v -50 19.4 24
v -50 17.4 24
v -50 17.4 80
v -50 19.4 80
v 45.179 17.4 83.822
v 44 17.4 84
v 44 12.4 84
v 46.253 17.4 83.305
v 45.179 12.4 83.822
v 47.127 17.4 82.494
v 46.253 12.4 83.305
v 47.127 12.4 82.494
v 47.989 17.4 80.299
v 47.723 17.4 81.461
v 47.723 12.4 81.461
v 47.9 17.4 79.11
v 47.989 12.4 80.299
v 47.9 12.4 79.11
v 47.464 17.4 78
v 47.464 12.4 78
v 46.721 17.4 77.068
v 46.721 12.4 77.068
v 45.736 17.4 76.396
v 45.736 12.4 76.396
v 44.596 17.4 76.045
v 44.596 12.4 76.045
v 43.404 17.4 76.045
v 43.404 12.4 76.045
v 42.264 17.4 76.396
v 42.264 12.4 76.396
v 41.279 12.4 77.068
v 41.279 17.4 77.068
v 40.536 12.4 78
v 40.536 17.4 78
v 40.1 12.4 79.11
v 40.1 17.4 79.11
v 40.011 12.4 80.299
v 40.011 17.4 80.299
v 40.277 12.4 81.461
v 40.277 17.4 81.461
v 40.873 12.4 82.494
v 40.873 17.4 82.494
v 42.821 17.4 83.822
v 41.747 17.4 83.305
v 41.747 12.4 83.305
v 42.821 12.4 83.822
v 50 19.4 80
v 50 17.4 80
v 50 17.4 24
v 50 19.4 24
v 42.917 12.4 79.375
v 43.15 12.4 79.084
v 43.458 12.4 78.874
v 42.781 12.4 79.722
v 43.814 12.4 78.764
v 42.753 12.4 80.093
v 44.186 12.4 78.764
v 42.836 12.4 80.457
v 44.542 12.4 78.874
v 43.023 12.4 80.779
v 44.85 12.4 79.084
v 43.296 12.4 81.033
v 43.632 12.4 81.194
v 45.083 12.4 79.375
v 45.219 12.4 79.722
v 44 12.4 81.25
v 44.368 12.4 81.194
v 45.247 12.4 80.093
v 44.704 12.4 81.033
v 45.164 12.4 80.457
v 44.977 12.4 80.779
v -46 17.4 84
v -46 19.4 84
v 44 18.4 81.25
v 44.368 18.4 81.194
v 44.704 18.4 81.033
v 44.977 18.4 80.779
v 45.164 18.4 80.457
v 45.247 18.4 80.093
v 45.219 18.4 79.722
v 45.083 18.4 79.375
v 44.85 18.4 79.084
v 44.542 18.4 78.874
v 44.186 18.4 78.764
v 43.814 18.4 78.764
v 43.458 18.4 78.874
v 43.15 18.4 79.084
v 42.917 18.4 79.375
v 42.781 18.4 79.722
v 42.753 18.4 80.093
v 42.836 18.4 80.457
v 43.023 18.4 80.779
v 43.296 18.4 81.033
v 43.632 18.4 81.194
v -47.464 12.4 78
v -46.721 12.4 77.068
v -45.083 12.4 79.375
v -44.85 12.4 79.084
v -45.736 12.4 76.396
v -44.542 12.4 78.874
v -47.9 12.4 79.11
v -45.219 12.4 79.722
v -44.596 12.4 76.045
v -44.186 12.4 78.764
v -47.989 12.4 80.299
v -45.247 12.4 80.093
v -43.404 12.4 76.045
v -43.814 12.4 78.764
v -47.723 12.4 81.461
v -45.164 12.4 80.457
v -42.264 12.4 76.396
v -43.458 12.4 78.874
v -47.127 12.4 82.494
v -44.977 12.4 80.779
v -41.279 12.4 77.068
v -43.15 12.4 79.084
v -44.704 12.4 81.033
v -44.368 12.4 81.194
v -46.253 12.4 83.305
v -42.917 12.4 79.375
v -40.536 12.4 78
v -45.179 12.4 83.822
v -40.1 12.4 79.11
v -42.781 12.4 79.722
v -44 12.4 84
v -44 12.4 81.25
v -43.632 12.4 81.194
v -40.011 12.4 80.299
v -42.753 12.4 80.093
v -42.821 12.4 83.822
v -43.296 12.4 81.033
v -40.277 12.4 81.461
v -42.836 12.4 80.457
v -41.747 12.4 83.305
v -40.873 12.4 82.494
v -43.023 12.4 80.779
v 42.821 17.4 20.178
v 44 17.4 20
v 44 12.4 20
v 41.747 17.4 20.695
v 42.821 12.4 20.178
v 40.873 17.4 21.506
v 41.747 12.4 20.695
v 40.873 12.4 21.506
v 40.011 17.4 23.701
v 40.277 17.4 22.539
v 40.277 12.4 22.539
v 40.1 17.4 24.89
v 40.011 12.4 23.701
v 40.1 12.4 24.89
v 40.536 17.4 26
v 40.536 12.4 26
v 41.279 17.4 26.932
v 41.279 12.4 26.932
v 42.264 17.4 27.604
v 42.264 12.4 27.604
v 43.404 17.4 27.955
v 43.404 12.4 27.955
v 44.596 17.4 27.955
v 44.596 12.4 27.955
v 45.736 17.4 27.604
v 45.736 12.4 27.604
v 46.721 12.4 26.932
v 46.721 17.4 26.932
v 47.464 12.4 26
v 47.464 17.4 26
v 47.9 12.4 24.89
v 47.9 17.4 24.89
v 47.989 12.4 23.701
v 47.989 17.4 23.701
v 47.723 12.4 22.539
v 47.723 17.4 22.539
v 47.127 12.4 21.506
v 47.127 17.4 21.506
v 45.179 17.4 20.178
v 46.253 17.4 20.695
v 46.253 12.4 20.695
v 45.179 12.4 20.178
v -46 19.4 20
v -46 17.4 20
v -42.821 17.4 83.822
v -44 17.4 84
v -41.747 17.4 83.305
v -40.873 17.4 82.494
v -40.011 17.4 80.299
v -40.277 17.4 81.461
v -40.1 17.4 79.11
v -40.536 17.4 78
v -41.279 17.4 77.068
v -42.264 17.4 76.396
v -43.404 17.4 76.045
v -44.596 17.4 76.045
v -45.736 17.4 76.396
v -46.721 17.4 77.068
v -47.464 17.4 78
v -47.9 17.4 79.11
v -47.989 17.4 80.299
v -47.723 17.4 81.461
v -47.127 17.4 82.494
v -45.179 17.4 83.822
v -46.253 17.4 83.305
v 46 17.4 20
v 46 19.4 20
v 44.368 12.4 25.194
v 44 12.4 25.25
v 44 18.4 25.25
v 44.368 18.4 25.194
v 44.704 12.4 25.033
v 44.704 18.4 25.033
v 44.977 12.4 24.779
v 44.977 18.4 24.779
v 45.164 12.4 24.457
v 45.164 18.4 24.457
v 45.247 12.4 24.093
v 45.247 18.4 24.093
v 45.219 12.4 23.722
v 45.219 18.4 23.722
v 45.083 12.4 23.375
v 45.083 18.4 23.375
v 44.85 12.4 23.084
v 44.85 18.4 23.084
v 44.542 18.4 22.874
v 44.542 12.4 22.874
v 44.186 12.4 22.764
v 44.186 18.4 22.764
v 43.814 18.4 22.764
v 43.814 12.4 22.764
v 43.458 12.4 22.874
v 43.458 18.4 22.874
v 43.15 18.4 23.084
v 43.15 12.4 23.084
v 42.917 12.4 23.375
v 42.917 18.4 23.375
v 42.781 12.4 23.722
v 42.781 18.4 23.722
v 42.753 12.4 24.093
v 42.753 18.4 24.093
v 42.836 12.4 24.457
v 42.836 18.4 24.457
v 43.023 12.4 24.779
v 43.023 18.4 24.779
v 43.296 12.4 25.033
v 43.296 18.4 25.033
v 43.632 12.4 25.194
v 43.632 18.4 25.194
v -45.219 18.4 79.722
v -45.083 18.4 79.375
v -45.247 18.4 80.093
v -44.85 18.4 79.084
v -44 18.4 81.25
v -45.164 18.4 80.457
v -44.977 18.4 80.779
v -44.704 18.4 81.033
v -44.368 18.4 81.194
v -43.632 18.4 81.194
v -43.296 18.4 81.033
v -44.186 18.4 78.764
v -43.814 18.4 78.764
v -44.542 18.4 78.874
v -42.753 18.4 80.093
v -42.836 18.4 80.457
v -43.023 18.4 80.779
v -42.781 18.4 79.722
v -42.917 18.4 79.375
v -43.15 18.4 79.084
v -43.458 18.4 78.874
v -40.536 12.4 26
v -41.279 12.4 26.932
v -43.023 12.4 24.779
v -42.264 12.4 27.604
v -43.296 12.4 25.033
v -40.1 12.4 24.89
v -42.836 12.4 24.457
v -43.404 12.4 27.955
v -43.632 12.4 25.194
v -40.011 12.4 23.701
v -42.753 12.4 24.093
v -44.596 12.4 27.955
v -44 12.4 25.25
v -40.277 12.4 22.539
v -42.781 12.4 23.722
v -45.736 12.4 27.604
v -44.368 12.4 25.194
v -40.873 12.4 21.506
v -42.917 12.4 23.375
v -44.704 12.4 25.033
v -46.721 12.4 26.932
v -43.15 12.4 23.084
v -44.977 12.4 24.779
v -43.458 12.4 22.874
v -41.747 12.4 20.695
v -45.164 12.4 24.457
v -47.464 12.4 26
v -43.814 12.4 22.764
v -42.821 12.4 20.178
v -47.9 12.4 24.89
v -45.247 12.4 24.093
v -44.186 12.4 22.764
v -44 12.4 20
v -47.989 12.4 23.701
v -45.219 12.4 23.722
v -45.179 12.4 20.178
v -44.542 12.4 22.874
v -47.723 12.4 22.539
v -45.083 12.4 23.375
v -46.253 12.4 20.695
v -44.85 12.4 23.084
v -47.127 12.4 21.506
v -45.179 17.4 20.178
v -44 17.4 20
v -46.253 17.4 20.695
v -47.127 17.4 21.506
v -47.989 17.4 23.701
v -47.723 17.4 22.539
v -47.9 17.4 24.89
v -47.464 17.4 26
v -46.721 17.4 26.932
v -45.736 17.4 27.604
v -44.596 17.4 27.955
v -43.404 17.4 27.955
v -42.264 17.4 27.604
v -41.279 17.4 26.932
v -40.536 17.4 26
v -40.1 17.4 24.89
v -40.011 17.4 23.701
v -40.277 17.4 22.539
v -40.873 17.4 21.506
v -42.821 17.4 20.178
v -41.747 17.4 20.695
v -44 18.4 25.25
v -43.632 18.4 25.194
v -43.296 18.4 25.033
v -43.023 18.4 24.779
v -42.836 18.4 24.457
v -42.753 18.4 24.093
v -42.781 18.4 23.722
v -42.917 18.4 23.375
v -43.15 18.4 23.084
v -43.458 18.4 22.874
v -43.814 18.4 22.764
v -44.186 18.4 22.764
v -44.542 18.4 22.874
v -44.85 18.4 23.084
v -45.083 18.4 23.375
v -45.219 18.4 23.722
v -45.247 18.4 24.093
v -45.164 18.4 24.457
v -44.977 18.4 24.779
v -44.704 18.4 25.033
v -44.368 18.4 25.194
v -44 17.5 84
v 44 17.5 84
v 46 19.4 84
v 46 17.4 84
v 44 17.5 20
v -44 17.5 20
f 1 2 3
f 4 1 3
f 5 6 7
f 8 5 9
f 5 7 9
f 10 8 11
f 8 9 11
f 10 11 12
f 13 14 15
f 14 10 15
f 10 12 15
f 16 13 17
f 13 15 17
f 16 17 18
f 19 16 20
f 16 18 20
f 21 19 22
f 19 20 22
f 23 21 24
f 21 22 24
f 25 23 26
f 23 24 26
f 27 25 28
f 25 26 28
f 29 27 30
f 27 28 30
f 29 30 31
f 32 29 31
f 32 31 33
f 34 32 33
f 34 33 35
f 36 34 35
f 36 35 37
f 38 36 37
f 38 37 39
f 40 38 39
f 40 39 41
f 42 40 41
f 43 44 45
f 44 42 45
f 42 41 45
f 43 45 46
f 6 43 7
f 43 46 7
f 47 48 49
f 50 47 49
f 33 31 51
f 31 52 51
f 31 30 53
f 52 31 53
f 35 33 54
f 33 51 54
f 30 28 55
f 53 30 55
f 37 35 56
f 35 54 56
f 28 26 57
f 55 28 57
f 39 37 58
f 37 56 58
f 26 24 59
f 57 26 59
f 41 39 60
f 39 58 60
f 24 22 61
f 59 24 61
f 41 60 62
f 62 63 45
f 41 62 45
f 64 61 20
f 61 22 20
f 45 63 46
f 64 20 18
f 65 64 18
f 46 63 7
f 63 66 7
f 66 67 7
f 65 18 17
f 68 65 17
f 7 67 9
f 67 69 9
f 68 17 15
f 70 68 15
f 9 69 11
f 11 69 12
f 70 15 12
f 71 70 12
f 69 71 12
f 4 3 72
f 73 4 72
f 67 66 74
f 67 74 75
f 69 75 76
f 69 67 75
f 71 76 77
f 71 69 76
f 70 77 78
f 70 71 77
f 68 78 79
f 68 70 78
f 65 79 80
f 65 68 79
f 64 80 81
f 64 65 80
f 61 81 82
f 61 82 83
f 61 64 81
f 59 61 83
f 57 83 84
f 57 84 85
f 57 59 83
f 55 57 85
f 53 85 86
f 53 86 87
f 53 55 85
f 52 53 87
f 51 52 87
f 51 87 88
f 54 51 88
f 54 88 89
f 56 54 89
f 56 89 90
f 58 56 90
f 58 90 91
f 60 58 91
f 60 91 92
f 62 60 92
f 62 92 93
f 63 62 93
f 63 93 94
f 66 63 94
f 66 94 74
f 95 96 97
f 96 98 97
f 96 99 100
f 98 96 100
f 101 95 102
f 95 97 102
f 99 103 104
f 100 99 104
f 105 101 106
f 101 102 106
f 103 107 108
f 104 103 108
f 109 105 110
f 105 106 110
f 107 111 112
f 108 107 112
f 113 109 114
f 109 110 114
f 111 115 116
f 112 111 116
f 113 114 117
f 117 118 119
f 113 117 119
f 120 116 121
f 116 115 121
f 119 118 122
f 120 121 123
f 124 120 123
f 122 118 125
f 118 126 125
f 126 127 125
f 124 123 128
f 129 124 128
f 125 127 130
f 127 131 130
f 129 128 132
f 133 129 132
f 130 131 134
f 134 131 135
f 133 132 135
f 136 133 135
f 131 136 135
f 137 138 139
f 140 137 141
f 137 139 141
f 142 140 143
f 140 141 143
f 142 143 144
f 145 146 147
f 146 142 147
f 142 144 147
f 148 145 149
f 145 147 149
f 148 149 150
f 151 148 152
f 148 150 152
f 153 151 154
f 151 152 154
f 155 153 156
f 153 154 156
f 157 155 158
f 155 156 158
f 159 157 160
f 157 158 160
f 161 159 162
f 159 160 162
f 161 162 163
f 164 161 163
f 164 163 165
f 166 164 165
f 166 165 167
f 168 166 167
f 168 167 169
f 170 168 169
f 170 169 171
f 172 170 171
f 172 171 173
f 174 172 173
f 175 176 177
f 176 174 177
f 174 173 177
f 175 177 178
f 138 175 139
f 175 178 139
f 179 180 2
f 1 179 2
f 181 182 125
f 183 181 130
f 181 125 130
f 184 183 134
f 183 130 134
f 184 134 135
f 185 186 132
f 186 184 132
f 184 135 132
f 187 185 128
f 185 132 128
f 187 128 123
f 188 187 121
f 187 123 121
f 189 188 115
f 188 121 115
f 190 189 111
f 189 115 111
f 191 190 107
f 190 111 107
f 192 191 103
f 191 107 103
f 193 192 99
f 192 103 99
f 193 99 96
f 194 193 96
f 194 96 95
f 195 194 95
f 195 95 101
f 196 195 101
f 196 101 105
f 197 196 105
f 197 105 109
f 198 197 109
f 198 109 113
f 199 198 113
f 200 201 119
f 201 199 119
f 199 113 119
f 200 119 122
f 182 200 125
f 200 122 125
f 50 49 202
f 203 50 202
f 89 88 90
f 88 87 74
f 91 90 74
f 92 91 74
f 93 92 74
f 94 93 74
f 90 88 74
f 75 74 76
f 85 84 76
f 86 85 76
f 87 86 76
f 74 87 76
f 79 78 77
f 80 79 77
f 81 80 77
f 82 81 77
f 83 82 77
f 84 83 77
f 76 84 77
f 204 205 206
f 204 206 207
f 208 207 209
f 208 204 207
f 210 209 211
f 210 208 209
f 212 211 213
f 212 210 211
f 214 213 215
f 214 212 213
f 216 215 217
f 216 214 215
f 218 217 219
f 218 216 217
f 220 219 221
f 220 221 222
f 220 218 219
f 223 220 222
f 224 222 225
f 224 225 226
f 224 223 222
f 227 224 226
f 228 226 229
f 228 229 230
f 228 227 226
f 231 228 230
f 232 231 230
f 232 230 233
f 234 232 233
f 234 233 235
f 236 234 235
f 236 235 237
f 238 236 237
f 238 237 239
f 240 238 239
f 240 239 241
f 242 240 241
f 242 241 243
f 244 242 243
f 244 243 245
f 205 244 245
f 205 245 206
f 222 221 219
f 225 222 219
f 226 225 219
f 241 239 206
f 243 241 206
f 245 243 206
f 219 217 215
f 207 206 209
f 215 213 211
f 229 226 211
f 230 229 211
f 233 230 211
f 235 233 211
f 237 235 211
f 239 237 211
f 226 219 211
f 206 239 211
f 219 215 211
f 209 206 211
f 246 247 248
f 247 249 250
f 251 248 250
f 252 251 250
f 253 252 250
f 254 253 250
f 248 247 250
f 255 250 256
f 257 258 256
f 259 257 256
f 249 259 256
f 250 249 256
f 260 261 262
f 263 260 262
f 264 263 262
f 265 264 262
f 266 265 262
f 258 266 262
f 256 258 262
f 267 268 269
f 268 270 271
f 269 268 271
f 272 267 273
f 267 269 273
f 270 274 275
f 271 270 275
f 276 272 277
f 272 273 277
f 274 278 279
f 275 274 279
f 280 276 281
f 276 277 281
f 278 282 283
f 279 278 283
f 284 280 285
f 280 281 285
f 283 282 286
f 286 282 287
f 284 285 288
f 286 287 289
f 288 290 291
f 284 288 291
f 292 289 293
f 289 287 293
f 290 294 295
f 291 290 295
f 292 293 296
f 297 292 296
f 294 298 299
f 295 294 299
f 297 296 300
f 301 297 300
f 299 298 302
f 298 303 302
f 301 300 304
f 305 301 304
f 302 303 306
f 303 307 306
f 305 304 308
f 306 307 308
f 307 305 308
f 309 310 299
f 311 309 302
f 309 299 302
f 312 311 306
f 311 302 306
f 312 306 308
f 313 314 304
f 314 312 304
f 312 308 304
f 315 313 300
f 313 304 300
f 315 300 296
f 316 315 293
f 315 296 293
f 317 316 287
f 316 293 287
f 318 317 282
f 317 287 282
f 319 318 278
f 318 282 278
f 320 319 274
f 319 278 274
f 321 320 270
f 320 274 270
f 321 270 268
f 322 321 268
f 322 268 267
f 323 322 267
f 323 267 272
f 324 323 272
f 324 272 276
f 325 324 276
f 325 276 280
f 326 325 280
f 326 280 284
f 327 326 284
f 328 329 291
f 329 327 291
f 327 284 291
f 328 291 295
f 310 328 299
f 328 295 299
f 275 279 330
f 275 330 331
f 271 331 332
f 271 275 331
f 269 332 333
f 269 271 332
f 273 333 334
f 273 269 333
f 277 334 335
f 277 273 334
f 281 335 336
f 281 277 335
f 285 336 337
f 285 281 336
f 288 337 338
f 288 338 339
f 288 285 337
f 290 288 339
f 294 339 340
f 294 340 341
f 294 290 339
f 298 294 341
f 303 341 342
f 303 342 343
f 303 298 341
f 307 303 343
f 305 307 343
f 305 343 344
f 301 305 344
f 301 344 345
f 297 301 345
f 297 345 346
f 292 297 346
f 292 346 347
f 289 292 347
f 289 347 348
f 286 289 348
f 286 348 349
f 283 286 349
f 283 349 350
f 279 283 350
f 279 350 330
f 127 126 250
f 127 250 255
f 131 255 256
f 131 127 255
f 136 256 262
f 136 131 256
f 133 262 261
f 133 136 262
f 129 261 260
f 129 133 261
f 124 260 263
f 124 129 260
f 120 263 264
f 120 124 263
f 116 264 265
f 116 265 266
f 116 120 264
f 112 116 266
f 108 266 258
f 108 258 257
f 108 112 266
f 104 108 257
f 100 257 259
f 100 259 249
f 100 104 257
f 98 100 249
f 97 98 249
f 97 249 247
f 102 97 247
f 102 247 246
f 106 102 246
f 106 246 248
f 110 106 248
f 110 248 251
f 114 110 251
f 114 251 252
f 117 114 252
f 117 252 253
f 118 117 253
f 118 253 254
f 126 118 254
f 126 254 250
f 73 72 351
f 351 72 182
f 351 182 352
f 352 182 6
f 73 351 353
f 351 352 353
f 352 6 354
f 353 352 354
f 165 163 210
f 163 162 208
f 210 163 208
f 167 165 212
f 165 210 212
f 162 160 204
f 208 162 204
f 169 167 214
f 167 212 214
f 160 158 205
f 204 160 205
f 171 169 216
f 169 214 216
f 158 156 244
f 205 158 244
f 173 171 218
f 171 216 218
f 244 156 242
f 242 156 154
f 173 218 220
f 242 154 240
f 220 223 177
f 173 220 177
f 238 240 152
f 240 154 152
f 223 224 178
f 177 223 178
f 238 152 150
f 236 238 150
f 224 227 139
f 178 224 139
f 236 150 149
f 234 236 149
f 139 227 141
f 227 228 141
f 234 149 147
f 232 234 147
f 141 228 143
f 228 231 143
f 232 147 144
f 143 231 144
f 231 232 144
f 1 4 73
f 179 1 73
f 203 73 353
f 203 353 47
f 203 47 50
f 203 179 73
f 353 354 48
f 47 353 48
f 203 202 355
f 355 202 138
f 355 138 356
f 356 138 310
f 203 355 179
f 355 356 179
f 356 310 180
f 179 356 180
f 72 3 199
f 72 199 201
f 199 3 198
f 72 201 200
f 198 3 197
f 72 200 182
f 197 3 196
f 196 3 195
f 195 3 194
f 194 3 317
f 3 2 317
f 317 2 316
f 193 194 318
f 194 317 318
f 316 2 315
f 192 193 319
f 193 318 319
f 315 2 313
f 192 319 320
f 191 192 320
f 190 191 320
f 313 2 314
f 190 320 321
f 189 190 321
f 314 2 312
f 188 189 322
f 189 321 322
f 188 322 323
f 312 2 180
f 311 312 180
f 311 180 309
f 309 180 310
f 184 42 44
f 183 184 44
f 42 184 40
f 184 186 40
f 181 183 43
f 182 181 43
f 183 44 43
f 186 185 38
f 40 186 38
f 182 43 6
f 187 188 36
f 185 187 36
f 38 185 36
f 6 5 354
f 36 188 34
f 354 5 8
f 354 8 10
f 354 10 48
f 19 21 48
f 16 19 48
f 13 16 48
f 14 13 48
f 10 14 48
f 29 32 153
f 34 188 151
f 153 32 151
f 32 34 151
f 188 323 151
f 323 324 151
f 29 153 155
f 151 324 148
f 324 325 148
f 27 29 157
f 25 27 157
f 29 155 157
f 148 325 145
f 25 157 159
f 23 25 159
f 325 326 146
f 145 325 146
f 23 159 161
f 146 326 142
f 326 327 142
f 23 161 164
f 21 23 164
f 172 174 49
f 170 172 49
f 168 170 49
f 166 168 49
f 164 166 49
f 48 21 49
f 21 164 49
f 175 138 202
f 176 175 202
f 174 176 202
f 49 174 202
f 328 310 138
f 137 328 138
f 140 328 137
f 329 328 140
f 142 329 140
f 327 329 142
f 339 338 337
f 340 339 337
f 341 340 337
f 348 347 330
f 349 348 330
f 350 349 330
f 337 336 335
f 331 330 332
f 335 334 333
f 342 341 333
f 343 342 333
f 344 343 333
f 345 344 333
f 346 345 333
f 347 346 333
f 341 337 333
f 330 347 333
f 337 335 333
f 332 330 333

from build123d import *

# Parameters (mm, degrees)
SHADE_PLATE_DEPTH = 2
SKETCH2_R         = 4
POSTS_DEPTH       = 5.1
SKETCH3_R         = 1.25
POST_PILOTS_DEPTH = 6.5


with BuildPart() as part:
    # Sketch1 → Shade Plate (new body)
    with BuildSketch(Plane(origin=(0, 17.4, 0), x_dir=(1, 0, 0), z_dir=(0, 1, 0))):
        Polygon((-46, -84), (46, -84), (50, -80), (50, -24), (46, -20), (-46, -20), (-50, -24), (-50, -80), align=None)
    extrude(amount=SHADE_PLATE_DEPTH)

    # Sketch2 → Posts (add)
    with BuildSketch(Plane(origin=(0, 12.4, 0), x_dir=(1, 0, 0), z_dir=(0, 1, 0))):
        with Locations(Location((-44, -24, 0), (0, 0, 90))):
            Circle(SKETCH2_R)
        with Locations(Location((-44, -80, 0), (0, 0, 270))):
            Circle(SKETCH2_R)
        with Locations(Location((44, -24, 0), (0, 0, 90))):
            Circle(SKETCH2_R)
        with Locations(Location((44, -80, 0), (0, 0, 270))):
            Circle(SKETCH2_R)
    extrude(amount=POSTS_DEPTH)

    # Sketch3 → Post Pilots (cut)
    with BuildSketch(Plane(origin=(0, 11.9, 0), x_dir=(1, 0, 0), z_dir=(0, 1, 0))):
        with Locations(Location((-44, -24, 0), (0, 0, 270))):
            Circle(SKETCH3_R)
        with Locations(Location((-44, -80, 0), (0, 0, 270))):
            Circle(SKETCH3_R)
        with Locations(Location((44, -24, 0), (0, 0, 270))):
            Circle(SKETCH3_R)
        with Locations(Location((44, -80, 0), (0, 0, 270))):
            Circle(SKETCH3_R)
    extrude(amount=POST_PILOTS_DEPTH, mode=Mode.SUBTRACT)


solid = part.part
